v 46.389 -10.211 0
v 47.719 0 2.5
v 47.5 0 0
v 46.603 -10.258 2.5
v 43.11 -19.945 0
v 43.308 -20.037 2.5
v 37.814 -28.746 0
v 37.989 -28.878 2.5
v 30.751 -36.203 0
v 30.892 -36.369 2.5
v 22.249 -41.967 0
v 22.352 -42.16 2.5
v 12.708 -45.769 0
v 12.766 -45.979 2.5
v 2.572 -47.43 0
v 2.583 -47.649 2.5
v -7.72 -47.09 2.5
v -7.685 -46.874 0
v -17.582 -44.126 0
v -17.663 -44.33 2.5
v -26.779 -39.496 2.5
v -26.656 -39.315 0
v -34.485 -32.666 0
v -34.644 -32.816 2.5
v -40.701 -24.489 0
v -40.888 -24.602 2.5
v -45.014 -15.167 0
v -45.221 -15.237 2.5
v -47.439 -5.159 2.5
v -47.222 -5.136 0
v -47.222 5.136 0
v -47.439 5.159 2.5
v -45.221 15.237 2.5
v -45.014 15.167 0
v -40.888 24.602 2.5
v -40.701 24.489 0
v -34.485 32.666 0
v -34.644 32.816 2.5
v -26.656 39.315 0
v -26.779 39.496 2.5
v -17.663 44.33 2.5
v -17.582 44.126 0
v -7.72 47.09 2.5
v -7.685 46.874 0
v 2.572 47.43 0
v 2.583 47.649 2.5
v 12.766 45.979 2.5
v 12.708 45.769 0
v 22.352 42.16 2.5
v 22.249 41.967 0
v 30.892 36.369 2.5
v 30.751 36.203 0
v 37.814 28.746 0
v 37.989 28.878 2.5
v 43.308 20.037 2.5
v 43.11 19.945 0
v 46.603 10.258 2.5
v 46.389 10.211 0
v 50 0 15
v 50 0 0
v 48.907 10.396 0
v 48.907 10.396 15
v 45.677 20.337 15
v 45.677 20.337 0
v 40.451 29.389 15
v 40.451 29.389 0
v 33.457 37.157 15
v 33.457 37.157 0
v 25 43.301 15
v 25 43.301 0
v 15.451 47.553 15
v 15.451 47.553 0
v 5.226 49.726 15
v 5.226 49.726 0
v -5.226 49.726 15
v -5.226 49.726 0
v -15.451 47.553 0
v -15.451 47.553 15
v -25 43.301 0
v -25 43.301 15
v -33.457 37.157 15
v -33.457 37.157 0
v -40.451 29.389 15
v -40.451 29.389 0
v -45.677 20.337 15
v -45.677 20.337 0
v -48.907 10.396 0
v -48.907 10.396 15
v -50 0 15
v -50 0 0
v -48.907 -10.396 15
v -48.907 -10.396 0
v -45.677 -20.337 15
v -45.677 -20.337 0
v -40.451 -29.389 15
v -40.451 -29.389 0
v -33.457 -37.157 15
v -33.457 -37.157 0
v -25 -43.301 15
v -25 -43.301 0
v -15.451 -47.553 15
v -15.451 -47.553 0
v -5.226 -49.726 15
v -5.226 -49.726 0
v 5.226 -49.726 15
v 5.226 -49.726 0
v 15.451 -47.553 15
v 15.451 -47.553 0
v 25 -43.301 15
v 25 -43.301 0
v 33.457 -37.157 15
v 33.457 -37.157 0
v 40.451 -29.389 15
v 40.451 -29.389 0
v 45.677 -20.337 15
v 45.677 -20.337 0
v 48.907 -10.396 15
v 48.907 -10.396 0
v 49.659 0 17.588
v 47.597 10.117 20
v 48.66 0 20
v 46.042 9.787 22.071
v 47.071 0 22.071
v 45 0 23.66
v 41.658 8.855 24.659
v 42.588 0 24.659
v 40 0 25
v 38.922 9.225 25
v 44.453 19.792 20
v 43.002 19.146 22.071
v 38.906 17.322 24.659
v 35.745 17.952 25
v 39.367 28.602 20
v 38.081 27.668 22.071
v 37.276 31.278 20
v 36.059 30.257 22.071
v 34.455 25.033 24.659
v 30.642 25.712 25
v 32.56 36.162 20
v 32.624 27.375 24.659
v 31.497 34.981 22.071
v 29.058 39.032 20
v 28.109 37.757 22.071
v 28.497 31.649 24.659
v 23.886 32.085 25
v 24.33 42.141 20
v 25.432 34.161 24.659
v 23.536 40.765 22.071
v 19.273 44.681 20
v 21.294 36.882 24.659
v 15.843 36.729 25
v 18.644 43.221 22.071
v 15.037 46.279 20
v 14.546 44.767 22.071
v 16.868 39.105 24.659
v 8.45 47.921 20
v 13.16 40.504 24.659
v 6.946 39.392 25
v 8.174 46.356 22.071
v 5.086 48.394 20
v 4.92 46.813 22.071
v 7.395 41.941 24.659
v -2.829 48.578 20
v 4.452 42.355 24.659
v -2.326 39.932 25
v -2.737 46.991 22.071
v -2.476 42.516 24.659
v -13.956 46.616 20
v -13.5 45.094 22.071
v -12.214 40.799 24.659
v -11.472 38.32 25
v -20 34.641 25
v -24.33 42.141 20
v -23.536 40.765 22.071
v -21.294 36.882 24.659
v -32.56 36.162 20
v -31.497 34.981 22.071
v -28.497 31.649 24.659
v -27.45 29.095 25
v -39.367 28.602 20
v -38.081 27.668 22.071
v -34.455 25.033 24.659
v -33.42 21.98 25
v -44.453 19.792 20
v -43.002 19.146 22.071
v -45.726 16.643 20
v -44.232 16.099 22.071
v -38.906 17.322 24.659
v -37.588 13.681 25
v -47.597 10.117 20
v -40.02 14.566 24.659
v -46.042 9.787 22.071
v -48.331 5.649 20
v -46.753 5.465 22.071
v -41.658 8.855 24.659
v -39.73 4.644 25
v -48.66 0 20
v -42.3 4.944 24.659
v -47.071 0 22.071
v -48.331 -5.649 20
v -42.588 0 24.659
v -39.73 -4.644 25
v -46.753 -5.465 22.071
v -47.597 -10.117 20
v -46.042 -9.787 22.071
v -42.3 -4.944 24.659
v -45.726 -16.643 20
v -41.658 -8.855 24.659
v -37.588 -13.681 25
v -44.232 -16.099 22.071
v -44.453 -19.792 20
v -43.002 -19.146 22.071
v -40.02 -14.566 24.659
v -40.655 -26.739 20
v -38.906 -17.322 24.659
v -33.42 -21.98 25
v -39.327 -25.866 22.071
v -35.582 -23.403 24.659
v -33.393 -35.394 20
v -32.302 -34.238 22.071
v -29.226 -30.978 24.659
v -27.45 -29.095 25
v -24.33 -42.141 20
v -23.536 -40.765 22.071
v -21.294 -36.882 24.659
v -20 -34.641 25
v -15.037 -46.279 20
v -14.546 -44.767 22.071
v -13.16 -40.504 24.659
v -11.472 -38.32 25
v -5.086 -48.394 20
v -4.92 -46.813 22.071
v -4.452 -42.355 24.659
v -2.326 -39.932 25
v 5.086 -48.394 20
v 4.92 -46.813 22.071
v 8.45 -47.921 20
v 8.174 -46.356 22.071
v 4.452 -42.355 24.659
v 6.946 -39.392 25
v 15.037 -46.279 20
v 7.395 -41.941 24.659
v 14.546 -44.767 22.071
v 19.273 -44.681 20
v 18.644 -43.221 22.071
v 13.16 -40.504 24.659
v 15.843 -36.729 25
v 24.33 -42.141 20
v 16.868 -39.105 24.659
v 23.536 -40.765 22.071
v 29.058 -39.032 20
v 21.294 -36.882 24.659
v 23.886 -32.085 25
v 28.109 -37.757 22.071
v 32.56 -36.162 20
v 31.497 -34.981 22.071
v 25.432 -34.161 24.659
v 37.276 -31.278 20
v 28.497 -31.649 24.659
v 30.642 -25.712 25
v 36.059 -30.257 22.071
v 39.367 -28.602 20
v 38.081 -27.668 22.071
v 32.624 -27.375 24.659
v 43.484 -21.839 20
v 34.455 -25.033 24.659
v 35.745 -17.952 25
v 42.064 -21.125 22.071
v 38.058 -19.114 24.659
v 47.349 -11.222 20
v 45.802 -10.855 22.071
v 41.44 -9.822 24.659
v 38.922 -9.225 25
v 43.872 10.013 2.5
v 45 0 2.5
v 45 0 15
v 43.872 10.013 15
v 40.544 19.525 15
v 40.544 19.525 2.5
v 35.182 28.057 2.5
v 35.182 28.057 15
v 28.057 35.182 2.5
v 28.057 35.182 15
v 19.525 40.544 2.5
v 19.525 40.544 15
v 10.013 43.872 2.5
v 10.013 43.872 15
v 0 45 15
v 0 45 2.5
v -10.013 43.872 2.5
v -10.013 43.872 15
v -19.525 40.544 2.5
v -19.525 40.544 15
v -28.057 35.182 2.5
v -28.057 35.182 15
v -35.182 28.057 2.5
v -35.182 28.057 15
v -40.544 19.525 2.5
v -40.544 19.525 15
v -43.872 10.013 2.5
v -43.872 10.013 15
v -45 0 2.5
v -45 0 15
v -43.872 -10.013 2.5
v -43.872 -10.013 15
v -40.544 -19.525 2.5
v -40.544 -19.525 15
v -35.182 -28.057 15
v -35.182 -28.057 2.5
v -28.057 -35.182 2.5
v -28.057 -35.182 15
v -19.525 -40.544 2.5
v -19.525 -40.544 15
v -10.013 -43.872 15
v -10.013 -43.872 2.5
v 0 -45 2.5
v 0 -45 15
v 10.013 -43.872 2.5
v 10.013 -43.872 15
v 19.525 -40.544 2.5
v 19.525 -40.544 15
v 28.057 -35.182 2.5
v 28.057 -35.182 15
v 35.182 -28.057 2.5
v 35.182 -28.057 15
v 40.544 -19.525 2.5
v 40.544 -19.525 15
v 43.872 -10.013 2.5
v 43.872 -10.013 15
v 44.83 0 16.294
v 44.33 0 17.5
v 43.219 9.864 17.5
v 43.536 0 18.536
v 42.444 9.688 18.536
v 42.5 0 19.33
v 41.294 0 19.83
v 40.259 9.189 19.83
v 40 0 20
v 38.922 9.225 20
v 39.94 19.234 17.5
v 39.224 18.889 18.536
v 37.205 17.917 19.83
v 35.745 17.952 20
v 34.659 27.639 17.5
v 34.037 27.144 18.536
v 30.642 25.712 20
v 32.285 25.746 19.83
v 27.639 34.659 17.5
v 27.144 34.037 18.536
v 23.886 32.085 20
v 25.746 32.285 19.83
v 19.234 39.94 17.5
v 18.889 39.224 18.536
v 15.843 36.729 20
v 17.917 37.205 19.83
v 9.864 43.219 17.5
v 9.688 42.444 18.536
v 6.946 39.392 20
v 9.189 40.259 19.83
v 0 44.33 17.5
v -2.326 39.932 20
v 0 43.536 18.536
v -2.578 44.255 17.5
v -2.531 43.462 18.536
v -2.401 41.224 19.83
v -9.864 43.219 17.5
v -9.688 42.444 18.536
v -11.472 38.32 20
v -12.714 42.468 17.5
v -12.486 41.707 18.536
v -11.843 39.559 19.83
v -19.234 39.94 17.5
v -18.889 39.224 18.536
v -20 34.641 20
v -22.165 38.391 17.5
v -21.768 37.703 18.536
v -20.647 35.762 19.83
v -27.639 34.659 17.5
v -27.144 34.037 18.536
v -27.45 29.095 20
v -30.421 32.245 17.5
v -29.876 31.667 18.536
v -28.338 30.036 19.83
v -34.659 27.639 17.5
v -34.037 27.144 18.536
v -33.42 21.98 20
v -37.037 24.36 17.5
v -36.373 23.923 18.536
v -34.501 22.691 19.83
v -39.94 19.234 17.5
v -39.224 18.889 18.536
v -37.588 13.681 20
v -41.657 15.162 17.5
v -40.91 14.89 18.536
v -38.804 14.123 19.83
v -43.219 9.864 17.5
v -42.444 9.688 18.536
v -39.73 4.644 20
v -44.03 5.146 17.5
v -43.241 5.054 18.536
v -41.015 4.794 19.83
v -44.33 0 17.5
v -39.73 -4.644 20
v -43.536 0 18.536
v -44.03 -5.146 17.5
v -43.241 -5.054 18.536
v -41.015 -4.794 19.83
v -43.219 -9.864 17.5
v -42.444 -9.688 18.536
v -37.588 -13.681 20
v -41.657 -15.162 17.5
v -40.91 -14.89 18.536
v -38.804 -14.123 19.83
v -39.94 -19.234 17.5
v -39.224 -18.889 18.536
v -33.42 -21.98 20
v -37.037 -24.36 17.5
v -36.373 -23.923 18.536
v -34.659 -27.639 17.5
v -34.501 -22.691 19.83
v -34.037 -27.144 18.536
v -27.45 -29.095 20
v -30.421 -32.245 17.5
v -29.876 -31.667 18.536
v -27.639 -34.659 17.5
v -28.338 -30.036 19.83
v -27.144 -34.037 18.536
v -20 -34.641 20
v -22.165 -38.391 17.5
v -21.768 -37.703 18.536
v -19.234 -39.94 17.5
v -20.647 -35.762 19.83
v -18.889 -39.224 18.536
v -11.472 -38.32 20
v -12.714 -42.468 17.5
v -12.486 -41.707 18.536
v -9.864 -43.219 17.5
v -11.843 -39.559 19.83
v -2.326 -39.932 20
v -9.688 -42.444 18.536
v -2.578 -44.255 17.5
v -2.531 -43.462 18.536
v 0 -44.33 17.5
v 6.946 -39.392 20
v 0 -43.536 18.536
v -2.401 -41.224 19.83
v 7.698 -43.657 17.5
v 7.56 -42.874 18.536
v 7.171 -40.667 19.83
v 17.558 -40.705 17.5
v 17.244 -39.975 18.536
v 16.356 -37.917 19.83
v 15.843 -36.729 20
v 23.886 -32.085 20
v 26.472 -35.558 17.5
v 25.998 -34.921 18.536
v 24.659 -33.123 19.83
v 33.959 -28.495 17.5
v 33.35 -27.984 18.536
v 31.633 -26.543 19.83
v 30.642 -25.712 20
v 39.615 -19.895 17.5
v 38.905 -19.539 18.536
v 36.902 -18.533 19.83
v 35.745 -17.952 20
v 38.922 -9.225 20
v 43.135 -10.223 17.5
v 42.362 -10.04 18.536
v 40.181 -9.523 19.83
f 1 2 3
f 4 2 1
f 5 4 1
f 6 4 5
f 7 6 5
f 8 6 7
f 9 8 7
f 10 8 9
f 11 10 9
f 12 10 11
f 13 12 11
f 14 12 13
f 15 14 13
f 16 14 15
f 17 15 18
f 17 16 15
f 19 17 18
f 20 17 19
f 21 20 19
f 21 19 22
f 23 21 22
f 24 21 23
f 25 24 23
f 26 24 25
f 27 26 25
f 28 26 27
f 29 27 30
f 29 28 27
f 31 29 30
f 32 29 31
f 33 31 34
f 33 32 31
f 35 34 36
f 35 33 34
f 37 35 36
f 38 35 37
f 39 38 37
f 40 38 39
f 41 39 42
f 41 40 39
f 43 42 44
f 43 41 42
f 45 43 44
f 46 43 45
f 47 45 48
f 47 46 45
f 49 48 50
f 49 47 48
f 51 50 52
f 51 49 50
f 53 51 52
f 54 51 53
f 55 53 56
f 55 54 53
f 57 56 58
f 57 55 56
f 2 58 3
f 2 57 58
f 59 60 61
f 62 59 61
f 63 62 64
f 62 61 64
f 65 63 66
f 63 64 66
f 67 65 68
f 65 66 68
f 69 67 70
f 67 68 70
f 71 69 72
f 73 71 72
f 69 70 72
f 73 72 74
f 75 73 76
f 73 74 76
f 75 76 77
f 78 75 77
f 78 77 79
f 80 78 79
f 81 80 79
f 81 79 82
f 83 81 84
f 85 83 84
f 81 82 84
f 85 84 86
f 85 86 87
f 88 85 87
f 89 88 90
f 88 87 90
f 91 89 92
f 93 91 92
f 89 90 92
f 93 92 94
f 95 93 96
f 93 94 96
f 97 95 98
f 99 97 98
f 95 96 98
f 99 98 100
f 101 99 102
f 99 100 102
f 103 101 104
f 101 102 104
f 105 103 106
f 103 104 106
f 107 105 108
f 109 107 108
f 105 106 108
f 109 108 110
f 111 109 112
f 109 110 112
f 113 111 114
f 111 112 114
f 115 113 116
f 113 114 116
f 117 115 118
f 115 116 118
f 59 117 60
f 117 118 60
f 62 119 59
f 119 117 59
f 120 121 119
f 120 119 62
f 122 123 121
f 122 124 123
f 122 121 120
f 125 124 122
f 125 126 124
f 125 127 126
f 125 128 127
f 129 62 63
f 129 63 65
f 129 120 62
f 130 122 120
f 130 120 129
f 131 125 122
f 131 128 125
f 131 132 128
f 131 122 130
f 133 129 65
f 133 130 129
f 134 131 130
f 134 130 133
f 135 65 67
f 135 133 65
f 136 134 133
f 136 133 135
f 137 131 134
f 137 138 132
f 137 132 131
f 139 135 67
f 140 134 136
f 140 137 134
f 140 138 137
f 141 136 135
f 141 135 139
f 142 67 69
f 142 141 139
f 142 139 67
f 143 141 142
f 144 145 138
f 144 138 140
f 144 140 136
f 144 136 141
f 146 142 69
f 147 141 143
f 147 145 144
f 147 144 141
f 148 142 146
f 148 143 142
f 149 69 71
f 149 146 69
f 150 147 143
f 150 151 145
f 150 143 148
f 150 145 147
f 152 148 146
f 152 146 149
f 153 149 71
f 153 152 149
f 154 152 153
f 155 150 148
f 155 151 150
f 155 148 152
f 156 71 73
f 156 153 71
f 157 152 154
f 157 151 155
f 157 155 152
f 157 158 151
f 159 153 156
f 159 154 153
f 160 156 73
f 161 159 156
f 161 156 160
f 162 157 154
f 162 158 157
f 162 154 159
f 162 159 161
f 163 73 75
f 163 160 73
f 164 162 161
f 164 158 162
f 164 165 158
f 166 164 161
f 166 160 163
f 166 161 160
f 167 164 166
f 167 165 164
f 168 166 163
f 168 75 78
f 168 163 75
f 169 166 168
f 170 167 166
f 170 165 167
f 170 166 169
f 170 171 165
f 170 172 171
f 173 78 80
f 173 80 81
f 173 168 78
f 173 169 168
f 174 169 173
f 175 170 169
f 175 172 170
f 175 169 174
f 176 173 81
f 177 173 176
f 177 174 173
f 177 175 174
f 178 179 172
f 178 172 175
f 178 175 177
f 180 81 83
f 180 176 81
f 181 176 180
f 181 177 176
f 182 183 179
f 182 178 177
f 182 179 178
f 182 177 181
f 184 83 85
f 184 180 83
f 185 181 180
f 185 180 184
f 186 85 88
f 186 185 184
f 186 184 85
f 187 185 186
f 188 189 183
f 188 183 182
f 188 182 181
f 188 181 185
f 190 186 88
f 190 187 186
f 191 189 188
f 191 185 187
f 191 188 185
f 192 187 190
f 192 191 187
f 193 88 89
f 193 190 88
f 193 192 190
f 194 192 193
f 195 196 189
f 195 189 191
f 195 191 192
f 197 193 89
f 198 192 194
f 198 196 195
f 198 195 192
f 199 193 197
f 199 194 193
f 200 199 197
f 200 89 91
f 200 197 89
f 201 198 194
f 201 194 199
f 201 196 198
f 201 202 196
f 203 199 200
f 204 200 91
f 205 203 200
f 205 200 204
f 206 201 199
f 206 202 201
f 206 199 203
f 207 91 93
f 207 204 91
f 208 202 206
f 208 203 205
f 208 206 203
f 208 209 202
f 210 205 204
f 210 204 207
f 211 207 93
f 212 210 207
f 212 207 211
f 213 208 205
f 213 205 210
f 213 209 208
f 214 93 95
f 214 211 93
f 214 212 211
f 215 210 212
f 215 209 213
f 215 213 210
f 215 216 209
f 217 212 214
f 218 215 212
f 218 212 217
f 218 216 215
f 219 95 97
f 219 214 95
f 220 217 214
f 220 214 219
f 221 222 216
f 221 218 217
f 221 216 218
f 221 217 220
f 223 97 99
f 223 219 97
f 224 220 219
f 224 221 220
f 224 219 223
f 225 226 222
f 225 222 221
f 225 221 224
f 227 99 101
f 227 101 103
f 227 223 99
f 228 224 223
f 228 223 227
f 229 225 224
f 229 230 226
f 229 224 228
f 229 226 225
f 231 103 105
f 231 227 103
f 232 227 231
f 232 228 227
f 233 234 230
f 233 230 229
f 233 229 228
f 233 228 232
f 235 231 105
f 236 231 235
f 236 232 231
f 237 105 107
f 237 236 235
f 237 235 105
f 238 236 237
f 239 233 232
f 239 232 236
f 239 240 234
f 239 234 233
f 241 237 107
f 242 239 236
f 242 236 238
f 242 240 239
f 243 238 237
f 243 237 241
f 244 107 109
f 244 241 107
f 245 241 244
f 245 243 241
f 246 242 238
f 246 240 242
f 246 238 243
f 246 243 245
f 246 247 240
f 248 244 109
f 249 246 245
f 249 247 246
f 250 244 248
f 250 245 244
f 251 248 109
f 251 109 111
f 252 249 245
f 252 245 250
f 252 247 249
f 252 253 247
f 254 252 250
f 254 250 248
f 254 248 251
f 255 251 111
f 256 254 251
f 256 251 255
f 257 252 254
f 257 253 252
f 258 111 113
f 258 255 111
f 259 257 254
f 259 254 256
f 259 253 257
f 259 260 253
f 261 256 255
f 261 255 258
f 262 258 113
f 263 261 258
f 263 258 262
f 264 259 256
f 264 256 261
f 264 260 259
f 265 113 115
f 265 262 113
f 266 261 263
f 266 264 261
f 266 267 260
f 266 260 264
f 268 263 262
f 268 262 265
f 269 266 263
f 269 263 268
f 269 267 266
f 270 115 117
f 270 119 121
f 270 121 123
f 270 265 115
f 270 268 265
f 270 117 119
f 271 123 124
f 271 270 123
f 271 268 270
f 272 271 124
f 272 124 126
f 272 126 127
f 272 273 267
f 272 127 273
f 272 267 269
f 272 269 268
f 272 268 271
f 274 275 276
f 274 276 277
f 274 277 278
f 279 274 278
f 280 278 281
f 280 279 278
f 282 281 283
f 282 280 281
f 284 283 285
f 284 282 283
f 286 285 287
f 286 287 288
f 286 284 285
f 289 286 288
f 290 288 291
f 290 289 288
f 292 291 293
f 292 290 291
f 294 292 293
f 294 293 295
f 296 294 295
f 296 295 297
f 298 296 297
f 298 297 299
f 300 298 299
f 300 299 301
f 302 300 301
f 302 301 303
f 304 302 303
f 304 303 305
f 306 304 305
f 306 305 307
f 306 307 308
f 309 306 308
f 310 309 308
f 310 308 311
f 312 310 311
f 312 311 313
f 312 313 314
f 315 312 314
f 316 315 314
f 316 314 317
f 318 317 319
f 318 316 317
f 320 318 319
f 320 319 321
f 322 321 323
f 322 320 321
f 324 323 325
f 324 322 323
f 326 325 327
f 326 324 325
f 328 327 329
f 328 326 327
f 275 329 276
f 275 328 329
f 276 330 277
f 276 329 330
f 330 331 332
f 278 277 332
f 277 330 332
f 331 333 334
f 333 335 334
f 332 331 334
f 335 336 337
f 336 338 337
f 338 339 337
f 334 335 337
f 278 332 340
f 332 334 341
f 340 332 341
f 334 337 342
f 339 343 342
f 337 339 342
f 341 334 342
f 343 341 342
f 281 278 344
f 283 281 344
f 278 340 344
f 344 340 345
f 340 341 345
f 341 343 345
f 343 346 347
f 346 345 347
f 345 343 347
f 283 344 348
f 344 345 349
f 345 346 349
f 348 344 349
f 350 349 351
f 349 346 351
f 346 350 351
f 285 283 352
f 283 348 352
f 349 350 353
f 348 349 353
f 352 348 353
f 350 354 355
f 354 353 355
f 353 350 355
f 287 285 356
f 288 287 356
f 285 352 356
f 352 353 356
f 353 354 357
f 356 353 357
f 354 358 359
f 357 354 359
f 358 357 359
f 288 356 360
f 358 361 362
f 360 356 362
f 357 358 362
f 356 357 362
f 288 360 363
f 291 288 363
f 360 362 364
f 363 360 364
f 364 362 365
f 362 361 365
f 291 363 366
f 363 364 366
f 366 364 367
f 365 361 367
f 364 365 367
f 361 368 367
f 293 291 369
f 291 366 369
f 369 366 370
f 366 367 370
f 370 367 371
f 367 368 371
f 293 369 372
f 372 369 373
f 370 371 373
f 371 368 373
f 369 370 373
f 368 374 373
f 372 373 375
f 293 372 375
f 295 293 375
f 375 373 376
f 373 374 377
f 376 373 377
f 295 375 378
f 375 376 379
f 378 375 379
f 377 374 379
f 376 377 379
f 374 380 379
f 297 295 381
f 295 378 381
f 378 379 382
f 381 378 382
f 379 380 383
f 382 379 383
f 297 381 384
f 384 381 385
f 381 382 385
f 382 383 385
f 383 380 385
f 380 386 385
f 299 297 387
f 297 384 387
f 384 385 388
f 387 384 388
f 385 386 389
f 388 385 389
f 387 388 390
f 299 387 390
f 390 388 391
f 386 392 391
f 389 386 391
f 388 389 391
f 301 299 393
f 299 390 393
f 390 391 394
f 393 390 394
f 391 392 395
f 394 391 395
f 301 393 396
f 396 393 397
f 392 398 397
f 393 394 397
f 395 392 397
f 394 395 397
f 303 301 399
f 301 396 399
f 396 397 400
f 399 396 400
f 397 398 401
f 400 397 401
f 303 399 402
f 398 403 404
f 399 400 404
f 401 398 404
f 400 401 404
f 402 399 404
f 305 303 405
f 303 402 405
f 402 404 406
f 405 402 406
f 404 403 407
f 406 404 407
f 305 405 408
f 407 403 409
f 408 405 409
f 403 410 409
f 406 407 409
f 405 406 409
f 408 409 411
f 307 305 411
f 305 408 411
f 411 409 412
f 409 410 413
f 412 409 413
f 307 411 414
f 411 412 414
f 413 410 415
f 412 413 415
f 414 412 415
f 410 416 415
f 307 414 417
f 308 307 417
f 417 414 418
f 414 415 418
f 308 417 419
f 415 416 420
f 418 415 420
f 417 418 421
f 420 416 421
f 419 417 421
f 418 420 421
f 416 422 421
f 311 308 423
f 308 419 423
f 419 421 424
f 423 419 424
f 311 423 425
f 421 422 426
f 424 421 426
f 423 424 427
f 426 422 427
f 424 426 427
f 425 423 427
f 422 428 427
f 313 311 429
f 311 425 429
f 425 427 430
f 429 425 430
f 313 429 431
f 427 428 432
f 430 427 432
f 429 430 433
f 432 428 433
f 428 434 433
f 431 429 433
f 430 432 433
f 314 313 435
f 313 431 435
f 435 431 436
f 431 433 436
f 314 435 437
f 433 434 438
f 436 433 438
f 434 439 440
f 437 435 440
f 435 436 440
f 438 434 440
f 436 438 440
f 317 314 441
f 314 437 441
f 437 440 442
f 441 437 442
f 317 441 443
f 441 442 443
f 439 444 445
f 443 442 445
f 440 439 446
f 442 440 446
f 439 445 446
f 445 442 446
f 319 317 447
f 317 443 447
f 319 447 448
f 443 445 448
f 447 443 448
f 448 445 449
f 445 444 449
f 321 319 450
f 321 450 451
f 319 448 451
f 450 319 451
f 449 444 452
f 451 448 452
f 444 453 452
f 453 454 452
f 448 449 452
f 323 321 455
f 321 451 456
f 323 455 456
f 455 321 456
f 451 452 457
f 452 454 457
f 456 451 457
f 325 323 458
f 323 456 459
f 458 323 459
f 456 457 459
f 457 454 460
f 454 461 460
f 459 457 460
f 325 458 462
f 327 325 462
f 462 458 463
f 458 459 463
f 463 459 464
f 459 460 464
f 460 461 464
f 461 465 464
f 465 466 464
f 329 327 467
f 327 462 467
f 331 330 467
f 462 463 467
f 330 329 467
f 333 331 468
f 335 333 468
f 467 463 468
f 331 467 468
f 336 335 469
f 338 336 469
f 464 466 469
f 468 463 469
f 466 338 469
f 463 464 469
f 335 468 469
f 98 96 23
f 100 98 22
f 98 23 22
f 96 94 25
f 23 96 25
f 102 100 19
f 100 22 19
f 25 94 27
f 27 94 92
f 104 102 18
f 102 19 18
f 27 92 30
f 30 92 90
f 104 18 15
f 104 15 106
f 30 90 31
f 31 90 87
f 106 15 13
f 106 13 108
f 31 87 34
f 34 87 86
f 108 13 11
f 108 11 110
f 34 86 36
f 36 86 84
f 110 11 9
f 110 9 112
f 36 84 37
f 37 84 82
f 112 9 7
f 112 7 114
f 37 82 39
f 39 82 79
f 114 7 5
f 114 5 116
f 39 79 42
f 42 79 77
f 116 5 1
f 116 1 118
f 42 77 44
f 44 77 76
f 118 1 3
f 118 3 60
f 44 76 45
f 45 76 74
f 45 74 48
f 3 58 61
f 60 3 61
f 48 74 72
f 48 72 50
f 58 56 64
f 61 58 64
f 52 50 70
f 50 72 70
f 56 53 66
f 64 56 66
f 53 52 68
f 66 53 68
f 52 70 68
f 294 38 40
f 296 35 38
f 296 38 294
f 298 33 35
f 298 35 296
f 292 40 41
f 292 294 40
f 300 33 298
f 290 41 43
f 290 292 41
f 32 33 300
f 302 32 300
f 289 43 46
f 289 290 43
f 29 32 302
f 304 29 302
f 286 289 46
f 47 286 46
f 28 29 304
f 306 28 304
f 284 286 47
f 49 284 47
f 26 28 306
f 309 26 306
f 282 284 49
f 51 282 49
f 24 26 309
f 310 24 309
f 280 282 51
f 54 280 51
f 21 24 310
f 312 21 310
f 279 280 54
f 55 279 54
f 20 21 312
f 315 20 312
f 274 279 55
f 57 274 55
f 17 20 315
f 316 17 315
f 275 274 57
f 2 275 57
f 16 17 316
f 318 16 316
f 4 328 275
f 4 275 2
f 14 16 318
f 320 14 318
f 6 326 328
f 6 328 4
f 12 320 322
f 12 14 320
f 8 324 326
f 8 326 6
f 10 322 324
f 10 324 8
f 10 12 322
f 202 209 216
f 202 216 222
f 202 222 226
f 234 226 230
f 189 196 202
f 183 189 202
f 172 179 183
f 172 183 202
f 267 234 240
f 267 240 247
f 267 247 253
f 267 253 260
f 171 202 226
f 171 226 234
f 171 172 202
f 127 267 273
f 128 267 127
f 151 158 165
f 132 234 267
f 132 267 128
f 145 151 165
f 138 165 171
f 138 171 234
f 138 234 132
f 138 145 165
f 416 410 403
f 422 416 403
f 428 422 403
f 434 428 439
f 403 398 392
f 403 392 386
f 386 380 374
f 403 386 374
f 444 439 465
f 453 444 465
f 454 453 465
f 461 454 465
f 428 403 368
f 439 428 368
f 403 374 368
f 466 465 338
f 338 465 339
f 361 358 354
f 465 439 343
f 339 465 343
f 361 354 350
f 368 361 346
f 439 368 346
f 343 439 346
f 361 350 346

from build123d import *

# Parameters (mm, degrees)
F0_R     = 50
F1_DEPTH = 25
F2_R     = 10
F3_T     = -5
F4_R     = 47.5
F4_R_2   = 45
F5_DEPTH = 2.5
F5_TAPER = -5


with BuildPart() as f1:
    # F0 (on Top) → F1 (new body)
    with BuildSketch(Plane.XY):
        Circle(F0_R)
    extrude(amount=F1_DEPTH)

    # F2
    f2_edges = [f1.edges().sort_by_distance(p)[0] for p in [
        (-50, 0, 25),
    ]]
    fillet(f2_edges, radius=F2_R)

    # F3
    f3_openings = [f1.faces().sort_by_distance(p)[0] for p in [
        (0, 0, 0),
    ]]
    offset(amount=F3_T, openings=f3_openings)

    # F4 (on face) → F5 (cut)
    with BuildSketch(Plane(origin=(0, 0, 0), x_dir=(1, 0, 0), z_dir=(0, 0, -1))):
        Circle(F4_R)
        Circle(F4_R_2, mode=Mode.SUBTRACT)
    extrude(amount=-F5_DEPTH, taper=F5_TAPER, mode=Mode.SUBTRACT)


solid = f1.part
